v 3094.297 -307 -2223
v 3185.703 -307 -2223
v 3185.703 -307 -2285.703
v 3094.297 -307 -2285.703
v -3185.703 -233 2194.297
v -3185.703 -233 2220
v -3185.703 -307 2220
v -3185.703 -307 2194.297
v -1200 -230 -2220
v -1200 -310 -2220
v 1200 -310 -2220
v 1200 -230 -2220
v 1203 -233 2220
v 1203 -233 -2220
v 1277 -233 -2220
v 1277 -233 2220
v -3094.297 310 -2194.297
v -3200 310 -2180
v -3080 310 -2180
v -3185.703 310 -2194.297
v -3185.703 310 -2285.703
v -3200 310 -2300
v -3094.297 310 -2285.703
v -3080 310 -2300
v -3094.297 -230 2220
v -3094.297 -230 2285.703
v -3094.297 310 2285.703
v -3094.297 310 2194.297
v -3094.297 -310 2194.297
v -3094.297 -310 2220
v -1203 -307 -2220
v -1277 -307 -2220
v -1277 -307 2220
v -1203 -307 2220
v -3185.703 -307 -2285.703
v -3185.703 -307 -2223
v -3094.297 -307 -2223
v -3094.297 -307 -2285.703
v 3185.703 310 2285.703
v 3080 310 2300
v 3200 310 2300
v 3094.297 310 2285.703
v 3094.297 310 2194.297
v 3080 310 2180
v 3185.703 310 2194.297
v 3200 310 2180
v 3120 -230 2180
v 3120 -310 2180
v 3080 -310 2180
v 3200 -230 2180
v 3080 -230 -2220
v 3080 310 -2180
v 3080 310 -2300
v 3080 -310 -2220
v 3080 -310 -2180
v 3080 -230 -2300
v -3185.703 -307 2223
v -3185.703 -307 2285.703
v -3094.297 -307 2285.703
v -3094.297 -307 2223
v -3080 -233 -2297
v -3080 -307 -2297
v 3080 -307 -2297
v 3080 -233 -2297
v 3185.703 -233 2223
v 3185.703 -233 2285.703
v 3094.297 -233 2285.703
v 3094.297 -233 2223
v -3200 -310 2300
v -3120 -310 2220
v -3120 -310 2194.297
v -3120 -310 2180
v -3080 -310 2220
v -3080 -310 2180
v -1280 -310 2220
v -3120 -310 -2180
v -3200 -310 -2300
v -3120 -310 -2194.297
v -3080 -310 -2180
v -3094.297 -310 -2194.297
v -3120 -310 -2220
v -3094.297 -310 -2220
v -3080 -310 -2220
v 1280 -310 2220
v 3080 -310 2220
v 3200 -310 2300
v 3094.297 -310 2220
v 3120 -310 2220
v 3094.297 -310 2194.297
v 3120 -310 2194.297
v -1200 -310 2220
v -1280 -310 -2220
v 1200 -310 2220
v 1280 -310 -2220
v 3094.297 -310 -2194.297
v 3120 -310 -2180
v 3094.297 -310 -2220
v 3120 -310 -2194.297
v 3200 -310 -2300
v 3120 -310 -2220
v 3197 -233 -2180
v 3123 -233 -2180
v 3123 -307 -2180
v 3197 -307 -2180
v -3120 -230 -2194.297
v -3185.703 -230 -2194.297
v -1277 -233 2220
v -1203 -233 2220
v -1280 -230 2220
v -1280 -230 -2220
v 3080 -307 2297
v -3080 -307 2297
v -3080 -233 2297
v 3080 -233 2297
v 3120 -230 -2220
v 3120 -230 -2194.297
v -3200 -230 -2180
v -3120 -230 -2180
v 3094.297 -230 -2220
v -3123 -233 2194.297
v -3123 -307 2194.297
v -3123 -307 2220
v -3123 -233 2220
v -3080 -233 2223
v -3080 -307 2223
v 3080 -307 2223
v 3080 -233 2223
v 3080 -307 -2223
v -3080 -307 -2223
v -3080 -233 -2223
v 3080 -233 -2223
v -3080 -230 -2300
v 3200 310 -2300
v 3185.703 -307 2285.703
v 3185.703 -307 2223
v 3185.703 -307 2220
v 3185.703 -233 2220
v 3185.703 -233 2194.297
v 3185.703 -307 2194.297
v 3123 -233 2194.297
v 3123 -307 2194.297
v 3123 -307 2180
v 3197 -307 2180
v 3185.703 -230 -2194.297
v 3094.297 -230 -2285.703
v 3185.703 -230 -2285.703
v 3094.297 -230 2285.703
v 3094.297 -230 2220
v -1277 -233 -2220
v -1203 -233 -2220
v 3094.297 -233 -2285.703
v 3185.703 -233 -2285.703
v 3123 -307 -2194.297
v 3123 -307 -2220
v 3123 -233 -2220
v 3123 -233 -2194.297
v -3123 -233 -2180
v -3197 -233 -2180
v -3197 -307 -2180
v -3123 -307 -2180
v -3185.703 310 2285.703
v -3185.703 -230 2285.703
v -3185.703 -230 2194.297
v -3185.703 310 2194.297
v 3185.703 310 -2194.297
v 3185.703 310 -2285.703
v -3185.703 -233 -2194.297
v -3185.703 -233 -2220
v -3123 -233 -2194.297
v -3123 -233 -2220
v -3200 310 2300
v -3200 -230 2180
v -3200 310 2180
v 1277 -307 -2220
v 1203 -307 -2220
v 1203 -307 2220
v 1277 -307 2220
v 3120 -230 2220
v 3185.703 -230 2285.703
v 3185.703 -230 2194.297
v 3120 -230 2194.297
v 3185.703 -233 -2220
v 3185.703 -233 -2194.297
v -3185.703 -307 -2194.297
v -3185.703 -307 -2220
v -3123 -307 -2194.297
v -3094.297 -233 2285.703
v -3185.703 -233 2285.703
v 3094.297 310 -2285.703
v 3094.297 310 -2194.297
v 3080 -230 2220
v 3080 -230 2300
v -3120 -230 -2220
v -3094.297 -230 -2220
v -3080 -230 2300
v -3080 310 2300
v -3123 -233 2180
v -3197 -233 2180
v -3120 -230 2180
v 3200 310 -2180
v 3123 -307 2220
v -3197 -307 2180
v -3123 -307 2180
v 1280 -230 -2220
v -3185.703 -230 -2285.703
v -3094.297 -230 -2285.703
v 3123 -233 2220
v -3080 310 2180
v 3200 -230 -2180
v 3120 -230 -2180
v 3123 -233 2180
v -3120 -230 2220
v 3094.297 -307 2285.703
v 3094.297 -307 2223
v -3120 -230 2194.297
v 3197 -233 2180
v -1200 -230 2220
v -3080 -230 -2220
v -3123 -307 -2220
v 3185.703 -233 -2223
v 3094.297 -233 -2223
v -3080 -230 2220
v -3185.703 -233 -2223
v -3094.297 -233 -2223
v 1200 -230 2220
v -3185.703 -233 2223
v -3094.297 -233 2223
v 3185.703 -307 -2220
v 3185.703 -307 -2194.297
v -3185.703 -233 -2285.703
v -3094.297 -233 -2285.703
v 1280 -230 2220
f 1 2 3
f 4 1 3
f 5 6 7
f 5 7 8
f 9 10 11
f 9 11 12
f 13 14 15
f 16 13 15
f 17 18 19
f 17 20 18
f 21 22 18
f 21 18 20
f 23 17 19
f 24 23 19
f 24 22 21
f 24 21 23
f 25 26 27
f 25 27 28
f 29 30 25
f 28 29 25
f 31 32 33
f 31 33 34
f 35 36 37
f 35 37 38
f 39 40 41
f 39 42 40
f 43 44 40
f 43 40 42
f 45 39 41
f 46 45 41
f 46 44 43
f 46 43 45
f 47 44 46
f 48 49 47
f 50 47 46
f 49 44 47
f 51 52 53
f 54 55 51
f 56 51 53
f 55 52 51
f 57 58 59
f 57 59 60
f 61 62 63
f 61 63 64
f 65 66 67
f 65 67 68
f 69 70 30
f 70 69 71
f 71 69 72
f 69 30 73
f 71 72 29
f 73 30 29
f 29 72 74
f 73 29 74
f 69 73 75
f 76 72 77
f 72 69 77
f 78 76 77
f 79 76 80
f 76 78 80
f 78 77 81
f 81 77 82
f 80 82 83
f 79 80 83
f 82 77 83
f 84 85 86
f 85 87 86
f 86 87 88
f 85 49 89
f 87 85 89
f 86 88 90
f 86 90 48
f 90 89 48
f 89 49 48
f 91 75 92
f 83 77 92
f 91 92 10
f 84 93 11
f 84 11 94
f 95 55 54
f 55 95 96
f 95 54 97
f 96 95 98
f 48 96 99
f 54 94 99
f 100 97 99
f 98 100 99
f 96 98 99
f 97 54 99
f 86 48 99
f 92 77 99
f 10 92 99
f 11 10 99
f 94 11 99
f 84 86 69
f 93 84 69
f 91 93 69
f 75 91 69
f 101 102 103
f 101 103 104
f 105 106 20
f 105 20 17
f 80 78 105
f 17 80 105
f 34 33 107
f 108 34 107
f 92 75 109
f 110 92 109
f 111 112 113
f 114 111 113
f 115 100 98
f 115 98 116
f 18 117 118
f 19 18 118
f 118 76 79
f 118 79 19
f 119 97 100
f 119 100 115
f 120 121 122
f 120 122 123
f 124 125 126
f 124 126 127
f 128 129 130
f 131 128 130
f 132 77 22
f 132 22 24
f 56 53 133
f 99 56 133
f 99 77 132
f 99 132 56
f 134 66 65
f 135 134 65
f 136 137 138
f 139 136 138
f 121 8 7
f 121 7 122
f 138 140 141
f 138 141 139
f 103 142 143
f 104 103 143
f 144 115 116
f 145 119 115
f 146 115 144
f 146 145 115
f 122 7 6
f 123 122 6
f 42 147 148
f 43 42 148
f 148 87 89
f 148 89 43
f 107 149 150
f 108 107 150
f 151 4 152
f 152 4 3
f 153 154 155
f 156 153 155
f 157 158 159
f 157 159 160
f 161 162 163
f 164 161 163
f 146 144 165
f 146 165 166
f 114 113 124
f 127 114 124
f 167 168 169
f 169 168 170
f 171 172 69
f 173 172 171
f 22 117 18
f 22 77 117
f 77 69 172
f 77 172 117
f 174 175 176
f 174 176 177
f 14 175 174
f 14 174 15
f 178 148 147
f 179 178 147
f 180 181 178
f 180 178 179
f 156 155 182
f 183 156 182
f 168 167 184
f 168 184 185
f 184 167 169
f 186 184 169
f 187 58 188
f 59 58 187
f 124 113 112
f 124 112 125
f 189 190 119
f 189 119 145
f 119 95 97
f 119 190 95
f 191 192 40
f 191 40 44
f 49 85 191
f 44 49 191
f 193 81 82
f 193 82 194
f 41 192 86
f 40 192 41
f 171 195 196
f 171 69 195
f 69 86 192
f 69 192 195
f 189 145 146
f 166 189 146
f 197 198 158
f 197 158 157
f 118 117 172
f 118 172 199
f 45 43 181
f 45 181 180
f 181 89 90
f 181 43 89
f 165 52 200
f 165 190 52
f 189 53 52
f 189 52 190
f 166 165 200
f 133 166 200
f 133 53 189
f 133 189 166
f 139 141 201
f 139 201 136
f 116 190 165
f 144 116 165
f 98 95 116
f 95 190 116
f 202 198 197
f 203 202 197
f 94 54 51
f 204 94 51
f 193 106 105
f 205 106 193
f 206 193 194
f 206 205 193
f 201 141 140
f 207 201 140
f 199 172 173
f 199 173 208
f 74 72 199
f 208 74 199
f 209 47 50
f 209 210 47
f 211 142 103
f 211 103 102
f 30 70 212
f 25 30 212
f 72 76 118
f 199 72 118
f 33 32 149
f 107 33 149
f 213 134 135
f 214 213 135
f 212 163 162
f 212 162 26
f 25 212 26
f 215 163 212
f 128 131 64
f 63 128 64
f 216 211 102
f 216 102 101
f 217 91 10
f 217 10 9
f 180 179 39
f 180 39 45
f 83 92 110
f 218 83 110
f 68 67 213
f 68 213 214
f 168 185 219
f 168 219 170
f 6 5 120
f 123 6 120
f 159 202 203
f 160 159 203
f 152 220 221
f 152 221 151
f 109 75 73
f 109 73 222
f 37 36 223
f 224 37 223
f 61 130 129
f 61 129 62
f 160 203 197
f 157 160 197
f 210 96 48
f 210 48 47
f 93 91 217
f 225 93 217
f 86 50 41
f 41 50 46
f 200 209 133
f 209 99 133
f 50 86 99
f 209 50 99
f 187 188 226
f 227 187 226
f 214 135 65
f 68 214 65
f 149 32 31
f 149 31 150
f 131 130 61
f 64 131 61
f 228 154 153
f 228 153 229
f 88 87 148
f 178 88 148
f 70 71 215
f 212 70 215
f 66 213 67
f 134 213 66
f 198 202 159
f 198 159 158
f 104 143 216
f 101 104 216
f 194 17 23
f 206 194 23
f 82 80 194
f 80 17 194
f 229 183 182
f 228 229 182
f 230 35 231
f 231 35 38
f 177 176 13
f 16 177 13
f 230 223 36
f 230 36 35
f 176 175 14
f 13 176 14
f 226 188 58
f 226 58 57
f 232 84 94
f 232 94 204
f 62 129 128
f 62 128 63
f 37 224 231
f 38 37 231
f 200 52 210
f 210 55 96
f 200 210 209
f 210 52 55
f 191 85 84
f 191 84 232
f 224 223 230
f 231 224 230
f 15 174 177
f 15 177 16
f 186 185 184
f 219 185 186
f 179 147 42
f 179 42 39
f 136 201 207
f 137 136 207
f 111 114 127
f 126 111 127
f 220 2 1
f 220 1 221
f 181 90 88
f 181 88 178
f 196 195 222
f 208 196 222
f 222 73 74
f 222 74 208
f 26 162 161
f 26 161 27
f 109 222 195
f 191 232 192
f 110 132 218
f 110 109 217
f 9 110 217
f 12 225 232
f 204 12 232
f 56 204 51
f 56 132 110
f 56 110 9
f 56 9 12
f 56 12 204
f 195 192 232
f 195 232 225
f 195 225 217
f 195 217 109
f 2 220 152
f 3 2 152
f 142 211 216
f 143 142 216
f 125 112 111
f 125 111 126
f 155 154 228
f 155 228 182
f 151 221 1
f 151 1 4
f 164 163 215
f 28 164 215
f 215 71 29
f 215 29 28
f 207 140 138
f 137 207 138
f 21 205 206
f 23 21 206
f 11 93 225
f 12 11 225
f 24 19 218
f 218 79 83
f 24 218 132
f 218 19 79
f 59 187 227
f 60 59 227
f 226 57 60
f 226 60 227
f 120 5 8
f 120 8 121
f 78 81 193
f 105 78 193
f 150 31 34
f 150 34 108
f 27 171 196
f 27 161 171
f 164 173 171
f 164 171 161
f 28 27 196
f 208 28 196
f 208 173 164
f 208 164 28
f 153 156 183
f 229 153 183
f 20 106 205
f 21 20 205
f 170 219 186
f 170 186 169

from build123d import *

# Parameters (mm, degrees)
BOSS_EXTRUDE1_START  = -3200
SKETCH1_W            = 80
SKETCH1_H            = 80
SKETCH1_W_2          = 74
SKETCH1_H_2          = 74
BOSS_EXTRUDE1_DEPTH  = 6400
BOSS_EXTRUDE2_START  = -3200
SKETCH2_W            = 80
SKETCH2_H            = 80
SKETCH2_W_2          = 74
SKETCH2_H_2          = 74
BOSS_EXTRUDE2_DEPTH  = 6400
BOSS_EXTRUDE3_START  = -2220
SKETCH3_W            = 80
SKETCH3_H            = 80
SKETCH3_W_2          = 74
SKETCH3_H_2          = 74
BOSS_EXTRUDE3_DEPTH  = 4440
BOSS_EXTRUDE4_START  = -2220
SKETCH4_W            = 80
SKETCH4_H            = 80
SKETCH4_W_2          = 74
SKETCH4_H_2          = 74
BOSS_EXTRUDE4_DEPTH  = 4440
BOSS_EXTRUDE5_START  = -2220
SKETCH5_W            = 80
SKETCH5_H            = 80
SKETCH5_W_2          = 74
SKETCH5_H_2          = 74
BOSS_EXTRUDE5_DEPTH  = 4440
BOSS_EXTRUDE6_START  = -2220
SKETCH6_W            = 80
SKETCH6_H            = 80
SKETCH6_W_2          = 74
SKETCH6_H_2          = 74
BOSS_EXTRUDE6_DEPTH  = 4440
BOSS_EXTRUDE7_START  = -310
SKETCH7_W            = 120
SKETCH7_H            = 120
SKETCH7_W_2          = 91.406932704
SKETCH7_H_2          = 91.406932704
BOSS_EXTRUDE7_DEPTH  = 620
BOSS_EXTRUDE8_START  = -310
SKETCH8_W            = 120
SKETCH8_H            = 120
SKETCH8_W_2          = 91.406932704
SKETCH8_H_2          = 91.406932704
BOSS_EXTRUDE8_DEPTH  = 620
BOSS_EXTRUDE9_START  = -310
SKETCH9_W            = 120
SKETCH9_H            = 120
SKETCH9_W_2          = 91.406932704
SKETCH9_H_2          = 91.406932704
BOSS_EXTRUDE9_DEPTH  = 620
BOSS_EXTRUDE10_START = -310
SKETCH10_W           = 120
SKETCH10_H           = 120
SKETCH10_W_2         = 91.406932704
SKETCH10_H_2         = 91.406932704
BOSS_EXTRUDE10_DEPTH = 620


with BuildPart() as part:
    # Sketch1 → Boss-Extrude1 (new body)
    with BuildSketch(Plane(origin=(0, 0, 0), x_dir=(0, 0, -1), z_dir=(1, 0, 0)).offset(BOSS_EXTRUDE1_START)):
        with Locations((2260, -270)):
            Rectangle(SKETCH1_W, SKETCH1_H)
        with Locations((2260, -270)):
            Rectangle(SKETCH1_W_2, SKETCH1_H_2, mode=Mode.SUBTRACT)
    extrude(amount=BOSS_EXTRUDE1_DEPTH)



with BuildPart() as body_2:
    # Sketch2 → Boss-Extrude2 (new body)
    with BuildSketch(Plane(origin=(0, 0, 0), x_dir=(0, 0, -1), z_dir=(1, 0, 0)).offset(BOSS_EXTRUDE2_START)):
        with Locations((-2260, -270)):
            Rectangle(SKETCH2_W, SKETCH2_H)
        with Locations((-2260, -270)):
            Rectangle(SKETCH2_W_2, SKETCH2_H_2, mode=Mode.SUBTRACT)
    extrude(amount=BOSS_EXTRUDE2_DEPTH)


with BuildPart() as part_1:
    add(part.part)

    add(body_2.part)  # Boss-Extrude3 merges body 2
    # Sketch3 → Boss-Extrude3 (add)
    with BuildSketch(Plane.XY.offset(BOSS_EXTRUDE3_START)):
        with Locations((-3160, -270)):
            Rectangle(SKETCH3_W, SKETCH3_H)
        with Locations((-3160, -270)):
            Rectangle(SKETCH3_W_2, SKETCH3_H_2, mode=Mode.SUBTRACT)
    extrude(amount=BOSS_EXTRUDE3_DEPTH)

    # Sketch4 → Boss-Extrude4 (add)
    with BuildSketch(Plane.XY.offset(BOSS_EXTRUDE4_START)):
        with Locations((-1240, -270)):
            Rectangle(SKETCH4_W, SKETCH4_H)
        with Locations((-1240, -270)):
            Rectangle(SKETCH4_W_2, SKETCH4_H_2, mode=Mode.SUBTRACT)
    extrude(amount=BOSS_EXTRUDE4_DEPTH)

    # Sketch5 → Boss-Extrude5 (add)
    with BuildSketch(Plane.XY.offset(BOSS_EXTRUDE5_START)):
        with Locations((3160, -270)):
            Rectangle(SKETCH5_W, SKETCH5_H)
        with Locations((3160, -270)):
            Rectangle(SKETCH5_W_2, SKETCH5_H_2, mode=Mode.SUBTRACT)
    extrude(amount=BOSS_EXTRUDE5_DEPTH)

    # Sketch6 → Boss-Extrude6 (add)
    with BuildSketch(Plane.XY.offset(BOSS_EXTRUDE6_START)):
        with Locations((1240, -270)):
            Rectangle(SKETCH6_W, SKETCH6_H)
        with Locations((1240, -270)):
            Rectangle(SKETCH6_W_2, SKETCH6_H_2, mode=Mode.SUBTRACT)
    extrude(amount=BOSS_EXTRUDE6_DEPTH)

    # Sketch7 → Boss-Extrude7 (add)
    with BuildSketch(Plane(origin=(0, 0, 0), x_dir=(1, 0, 0), z_dir=(0, 1, 0)).offset(BOSS_EXTRUDE7_START)):
        with Locations((-3140, 2240)):
            Rectangle(SKETCH7_W, SKETCH7_H)
        with Locations((-3140, 2240)):
            Rectangle(SKETCH7_W_2, SKETCH7_H_2, mode=Mode.SUBTRACT)
    extrude(amount=BOSS_EXTRUDE7_DEPTH)

    # Sketch8 → Boss-Extrude8 (add)
    with BuildSketch(Plane(origin=(0, 0, 0), x_dir=(1, 0, 0), z_dir=(0, 1, 0)).offset(BOSS_EXTRUDE8_START)):
        with Locations((-3140, -2240)):
            Rectangle(SKETCH8_W, SKETCH8_H)
        with Locations((-3140, -2240)):
            Rectangle(SKETCH8_W_2, SKETCH8_H_2, mode=Mode.SUBTRACT)
    extrude(amount=BOSS_EXTRUDE8_DEPTH)

    # Sketch9 → Boss-Extrude9 (add)
    with BuildSketch(Plane(origin=(0, 0, 0), x_dir=(1, 0, 0), z_dir=(0, 1, 0)).offset(BOSS_EXTRUDE9_START)):
        with Locations((3140, 2240)):
            Rectangle(SKETCH9_W, SKETCH9_H)
        with Locations((3140, 2240)):
            Rectangle(SKETCH9_W_2, SKETCH9_H_2, mode=Mode.SUBTRACT)
    extrude(amount=BOSS_EXTRUDE9_DEPTH)

    # Sketch10 → Boss-Extrude10 (add)
    with BuildSketch(Plane(origin=(0, 0, 0), x_dir=(1, 0, 0), z_dir=(0, 1, 0)).offset(BOSS_EXTRUDE10_START)):
        with Locations((3140, -2240)):
            Rectangle(SKETCH10_W, SKETCH10_H)
        with Locations((3140, -2240)):
            Rectangle(SKETCH10_W_2, SKETCH10_H_2, mode=Mode.SUBTRACT)
    extrude(amount=BOSS_EXTRUDE10_DEPTH)


solid = part_1.part
